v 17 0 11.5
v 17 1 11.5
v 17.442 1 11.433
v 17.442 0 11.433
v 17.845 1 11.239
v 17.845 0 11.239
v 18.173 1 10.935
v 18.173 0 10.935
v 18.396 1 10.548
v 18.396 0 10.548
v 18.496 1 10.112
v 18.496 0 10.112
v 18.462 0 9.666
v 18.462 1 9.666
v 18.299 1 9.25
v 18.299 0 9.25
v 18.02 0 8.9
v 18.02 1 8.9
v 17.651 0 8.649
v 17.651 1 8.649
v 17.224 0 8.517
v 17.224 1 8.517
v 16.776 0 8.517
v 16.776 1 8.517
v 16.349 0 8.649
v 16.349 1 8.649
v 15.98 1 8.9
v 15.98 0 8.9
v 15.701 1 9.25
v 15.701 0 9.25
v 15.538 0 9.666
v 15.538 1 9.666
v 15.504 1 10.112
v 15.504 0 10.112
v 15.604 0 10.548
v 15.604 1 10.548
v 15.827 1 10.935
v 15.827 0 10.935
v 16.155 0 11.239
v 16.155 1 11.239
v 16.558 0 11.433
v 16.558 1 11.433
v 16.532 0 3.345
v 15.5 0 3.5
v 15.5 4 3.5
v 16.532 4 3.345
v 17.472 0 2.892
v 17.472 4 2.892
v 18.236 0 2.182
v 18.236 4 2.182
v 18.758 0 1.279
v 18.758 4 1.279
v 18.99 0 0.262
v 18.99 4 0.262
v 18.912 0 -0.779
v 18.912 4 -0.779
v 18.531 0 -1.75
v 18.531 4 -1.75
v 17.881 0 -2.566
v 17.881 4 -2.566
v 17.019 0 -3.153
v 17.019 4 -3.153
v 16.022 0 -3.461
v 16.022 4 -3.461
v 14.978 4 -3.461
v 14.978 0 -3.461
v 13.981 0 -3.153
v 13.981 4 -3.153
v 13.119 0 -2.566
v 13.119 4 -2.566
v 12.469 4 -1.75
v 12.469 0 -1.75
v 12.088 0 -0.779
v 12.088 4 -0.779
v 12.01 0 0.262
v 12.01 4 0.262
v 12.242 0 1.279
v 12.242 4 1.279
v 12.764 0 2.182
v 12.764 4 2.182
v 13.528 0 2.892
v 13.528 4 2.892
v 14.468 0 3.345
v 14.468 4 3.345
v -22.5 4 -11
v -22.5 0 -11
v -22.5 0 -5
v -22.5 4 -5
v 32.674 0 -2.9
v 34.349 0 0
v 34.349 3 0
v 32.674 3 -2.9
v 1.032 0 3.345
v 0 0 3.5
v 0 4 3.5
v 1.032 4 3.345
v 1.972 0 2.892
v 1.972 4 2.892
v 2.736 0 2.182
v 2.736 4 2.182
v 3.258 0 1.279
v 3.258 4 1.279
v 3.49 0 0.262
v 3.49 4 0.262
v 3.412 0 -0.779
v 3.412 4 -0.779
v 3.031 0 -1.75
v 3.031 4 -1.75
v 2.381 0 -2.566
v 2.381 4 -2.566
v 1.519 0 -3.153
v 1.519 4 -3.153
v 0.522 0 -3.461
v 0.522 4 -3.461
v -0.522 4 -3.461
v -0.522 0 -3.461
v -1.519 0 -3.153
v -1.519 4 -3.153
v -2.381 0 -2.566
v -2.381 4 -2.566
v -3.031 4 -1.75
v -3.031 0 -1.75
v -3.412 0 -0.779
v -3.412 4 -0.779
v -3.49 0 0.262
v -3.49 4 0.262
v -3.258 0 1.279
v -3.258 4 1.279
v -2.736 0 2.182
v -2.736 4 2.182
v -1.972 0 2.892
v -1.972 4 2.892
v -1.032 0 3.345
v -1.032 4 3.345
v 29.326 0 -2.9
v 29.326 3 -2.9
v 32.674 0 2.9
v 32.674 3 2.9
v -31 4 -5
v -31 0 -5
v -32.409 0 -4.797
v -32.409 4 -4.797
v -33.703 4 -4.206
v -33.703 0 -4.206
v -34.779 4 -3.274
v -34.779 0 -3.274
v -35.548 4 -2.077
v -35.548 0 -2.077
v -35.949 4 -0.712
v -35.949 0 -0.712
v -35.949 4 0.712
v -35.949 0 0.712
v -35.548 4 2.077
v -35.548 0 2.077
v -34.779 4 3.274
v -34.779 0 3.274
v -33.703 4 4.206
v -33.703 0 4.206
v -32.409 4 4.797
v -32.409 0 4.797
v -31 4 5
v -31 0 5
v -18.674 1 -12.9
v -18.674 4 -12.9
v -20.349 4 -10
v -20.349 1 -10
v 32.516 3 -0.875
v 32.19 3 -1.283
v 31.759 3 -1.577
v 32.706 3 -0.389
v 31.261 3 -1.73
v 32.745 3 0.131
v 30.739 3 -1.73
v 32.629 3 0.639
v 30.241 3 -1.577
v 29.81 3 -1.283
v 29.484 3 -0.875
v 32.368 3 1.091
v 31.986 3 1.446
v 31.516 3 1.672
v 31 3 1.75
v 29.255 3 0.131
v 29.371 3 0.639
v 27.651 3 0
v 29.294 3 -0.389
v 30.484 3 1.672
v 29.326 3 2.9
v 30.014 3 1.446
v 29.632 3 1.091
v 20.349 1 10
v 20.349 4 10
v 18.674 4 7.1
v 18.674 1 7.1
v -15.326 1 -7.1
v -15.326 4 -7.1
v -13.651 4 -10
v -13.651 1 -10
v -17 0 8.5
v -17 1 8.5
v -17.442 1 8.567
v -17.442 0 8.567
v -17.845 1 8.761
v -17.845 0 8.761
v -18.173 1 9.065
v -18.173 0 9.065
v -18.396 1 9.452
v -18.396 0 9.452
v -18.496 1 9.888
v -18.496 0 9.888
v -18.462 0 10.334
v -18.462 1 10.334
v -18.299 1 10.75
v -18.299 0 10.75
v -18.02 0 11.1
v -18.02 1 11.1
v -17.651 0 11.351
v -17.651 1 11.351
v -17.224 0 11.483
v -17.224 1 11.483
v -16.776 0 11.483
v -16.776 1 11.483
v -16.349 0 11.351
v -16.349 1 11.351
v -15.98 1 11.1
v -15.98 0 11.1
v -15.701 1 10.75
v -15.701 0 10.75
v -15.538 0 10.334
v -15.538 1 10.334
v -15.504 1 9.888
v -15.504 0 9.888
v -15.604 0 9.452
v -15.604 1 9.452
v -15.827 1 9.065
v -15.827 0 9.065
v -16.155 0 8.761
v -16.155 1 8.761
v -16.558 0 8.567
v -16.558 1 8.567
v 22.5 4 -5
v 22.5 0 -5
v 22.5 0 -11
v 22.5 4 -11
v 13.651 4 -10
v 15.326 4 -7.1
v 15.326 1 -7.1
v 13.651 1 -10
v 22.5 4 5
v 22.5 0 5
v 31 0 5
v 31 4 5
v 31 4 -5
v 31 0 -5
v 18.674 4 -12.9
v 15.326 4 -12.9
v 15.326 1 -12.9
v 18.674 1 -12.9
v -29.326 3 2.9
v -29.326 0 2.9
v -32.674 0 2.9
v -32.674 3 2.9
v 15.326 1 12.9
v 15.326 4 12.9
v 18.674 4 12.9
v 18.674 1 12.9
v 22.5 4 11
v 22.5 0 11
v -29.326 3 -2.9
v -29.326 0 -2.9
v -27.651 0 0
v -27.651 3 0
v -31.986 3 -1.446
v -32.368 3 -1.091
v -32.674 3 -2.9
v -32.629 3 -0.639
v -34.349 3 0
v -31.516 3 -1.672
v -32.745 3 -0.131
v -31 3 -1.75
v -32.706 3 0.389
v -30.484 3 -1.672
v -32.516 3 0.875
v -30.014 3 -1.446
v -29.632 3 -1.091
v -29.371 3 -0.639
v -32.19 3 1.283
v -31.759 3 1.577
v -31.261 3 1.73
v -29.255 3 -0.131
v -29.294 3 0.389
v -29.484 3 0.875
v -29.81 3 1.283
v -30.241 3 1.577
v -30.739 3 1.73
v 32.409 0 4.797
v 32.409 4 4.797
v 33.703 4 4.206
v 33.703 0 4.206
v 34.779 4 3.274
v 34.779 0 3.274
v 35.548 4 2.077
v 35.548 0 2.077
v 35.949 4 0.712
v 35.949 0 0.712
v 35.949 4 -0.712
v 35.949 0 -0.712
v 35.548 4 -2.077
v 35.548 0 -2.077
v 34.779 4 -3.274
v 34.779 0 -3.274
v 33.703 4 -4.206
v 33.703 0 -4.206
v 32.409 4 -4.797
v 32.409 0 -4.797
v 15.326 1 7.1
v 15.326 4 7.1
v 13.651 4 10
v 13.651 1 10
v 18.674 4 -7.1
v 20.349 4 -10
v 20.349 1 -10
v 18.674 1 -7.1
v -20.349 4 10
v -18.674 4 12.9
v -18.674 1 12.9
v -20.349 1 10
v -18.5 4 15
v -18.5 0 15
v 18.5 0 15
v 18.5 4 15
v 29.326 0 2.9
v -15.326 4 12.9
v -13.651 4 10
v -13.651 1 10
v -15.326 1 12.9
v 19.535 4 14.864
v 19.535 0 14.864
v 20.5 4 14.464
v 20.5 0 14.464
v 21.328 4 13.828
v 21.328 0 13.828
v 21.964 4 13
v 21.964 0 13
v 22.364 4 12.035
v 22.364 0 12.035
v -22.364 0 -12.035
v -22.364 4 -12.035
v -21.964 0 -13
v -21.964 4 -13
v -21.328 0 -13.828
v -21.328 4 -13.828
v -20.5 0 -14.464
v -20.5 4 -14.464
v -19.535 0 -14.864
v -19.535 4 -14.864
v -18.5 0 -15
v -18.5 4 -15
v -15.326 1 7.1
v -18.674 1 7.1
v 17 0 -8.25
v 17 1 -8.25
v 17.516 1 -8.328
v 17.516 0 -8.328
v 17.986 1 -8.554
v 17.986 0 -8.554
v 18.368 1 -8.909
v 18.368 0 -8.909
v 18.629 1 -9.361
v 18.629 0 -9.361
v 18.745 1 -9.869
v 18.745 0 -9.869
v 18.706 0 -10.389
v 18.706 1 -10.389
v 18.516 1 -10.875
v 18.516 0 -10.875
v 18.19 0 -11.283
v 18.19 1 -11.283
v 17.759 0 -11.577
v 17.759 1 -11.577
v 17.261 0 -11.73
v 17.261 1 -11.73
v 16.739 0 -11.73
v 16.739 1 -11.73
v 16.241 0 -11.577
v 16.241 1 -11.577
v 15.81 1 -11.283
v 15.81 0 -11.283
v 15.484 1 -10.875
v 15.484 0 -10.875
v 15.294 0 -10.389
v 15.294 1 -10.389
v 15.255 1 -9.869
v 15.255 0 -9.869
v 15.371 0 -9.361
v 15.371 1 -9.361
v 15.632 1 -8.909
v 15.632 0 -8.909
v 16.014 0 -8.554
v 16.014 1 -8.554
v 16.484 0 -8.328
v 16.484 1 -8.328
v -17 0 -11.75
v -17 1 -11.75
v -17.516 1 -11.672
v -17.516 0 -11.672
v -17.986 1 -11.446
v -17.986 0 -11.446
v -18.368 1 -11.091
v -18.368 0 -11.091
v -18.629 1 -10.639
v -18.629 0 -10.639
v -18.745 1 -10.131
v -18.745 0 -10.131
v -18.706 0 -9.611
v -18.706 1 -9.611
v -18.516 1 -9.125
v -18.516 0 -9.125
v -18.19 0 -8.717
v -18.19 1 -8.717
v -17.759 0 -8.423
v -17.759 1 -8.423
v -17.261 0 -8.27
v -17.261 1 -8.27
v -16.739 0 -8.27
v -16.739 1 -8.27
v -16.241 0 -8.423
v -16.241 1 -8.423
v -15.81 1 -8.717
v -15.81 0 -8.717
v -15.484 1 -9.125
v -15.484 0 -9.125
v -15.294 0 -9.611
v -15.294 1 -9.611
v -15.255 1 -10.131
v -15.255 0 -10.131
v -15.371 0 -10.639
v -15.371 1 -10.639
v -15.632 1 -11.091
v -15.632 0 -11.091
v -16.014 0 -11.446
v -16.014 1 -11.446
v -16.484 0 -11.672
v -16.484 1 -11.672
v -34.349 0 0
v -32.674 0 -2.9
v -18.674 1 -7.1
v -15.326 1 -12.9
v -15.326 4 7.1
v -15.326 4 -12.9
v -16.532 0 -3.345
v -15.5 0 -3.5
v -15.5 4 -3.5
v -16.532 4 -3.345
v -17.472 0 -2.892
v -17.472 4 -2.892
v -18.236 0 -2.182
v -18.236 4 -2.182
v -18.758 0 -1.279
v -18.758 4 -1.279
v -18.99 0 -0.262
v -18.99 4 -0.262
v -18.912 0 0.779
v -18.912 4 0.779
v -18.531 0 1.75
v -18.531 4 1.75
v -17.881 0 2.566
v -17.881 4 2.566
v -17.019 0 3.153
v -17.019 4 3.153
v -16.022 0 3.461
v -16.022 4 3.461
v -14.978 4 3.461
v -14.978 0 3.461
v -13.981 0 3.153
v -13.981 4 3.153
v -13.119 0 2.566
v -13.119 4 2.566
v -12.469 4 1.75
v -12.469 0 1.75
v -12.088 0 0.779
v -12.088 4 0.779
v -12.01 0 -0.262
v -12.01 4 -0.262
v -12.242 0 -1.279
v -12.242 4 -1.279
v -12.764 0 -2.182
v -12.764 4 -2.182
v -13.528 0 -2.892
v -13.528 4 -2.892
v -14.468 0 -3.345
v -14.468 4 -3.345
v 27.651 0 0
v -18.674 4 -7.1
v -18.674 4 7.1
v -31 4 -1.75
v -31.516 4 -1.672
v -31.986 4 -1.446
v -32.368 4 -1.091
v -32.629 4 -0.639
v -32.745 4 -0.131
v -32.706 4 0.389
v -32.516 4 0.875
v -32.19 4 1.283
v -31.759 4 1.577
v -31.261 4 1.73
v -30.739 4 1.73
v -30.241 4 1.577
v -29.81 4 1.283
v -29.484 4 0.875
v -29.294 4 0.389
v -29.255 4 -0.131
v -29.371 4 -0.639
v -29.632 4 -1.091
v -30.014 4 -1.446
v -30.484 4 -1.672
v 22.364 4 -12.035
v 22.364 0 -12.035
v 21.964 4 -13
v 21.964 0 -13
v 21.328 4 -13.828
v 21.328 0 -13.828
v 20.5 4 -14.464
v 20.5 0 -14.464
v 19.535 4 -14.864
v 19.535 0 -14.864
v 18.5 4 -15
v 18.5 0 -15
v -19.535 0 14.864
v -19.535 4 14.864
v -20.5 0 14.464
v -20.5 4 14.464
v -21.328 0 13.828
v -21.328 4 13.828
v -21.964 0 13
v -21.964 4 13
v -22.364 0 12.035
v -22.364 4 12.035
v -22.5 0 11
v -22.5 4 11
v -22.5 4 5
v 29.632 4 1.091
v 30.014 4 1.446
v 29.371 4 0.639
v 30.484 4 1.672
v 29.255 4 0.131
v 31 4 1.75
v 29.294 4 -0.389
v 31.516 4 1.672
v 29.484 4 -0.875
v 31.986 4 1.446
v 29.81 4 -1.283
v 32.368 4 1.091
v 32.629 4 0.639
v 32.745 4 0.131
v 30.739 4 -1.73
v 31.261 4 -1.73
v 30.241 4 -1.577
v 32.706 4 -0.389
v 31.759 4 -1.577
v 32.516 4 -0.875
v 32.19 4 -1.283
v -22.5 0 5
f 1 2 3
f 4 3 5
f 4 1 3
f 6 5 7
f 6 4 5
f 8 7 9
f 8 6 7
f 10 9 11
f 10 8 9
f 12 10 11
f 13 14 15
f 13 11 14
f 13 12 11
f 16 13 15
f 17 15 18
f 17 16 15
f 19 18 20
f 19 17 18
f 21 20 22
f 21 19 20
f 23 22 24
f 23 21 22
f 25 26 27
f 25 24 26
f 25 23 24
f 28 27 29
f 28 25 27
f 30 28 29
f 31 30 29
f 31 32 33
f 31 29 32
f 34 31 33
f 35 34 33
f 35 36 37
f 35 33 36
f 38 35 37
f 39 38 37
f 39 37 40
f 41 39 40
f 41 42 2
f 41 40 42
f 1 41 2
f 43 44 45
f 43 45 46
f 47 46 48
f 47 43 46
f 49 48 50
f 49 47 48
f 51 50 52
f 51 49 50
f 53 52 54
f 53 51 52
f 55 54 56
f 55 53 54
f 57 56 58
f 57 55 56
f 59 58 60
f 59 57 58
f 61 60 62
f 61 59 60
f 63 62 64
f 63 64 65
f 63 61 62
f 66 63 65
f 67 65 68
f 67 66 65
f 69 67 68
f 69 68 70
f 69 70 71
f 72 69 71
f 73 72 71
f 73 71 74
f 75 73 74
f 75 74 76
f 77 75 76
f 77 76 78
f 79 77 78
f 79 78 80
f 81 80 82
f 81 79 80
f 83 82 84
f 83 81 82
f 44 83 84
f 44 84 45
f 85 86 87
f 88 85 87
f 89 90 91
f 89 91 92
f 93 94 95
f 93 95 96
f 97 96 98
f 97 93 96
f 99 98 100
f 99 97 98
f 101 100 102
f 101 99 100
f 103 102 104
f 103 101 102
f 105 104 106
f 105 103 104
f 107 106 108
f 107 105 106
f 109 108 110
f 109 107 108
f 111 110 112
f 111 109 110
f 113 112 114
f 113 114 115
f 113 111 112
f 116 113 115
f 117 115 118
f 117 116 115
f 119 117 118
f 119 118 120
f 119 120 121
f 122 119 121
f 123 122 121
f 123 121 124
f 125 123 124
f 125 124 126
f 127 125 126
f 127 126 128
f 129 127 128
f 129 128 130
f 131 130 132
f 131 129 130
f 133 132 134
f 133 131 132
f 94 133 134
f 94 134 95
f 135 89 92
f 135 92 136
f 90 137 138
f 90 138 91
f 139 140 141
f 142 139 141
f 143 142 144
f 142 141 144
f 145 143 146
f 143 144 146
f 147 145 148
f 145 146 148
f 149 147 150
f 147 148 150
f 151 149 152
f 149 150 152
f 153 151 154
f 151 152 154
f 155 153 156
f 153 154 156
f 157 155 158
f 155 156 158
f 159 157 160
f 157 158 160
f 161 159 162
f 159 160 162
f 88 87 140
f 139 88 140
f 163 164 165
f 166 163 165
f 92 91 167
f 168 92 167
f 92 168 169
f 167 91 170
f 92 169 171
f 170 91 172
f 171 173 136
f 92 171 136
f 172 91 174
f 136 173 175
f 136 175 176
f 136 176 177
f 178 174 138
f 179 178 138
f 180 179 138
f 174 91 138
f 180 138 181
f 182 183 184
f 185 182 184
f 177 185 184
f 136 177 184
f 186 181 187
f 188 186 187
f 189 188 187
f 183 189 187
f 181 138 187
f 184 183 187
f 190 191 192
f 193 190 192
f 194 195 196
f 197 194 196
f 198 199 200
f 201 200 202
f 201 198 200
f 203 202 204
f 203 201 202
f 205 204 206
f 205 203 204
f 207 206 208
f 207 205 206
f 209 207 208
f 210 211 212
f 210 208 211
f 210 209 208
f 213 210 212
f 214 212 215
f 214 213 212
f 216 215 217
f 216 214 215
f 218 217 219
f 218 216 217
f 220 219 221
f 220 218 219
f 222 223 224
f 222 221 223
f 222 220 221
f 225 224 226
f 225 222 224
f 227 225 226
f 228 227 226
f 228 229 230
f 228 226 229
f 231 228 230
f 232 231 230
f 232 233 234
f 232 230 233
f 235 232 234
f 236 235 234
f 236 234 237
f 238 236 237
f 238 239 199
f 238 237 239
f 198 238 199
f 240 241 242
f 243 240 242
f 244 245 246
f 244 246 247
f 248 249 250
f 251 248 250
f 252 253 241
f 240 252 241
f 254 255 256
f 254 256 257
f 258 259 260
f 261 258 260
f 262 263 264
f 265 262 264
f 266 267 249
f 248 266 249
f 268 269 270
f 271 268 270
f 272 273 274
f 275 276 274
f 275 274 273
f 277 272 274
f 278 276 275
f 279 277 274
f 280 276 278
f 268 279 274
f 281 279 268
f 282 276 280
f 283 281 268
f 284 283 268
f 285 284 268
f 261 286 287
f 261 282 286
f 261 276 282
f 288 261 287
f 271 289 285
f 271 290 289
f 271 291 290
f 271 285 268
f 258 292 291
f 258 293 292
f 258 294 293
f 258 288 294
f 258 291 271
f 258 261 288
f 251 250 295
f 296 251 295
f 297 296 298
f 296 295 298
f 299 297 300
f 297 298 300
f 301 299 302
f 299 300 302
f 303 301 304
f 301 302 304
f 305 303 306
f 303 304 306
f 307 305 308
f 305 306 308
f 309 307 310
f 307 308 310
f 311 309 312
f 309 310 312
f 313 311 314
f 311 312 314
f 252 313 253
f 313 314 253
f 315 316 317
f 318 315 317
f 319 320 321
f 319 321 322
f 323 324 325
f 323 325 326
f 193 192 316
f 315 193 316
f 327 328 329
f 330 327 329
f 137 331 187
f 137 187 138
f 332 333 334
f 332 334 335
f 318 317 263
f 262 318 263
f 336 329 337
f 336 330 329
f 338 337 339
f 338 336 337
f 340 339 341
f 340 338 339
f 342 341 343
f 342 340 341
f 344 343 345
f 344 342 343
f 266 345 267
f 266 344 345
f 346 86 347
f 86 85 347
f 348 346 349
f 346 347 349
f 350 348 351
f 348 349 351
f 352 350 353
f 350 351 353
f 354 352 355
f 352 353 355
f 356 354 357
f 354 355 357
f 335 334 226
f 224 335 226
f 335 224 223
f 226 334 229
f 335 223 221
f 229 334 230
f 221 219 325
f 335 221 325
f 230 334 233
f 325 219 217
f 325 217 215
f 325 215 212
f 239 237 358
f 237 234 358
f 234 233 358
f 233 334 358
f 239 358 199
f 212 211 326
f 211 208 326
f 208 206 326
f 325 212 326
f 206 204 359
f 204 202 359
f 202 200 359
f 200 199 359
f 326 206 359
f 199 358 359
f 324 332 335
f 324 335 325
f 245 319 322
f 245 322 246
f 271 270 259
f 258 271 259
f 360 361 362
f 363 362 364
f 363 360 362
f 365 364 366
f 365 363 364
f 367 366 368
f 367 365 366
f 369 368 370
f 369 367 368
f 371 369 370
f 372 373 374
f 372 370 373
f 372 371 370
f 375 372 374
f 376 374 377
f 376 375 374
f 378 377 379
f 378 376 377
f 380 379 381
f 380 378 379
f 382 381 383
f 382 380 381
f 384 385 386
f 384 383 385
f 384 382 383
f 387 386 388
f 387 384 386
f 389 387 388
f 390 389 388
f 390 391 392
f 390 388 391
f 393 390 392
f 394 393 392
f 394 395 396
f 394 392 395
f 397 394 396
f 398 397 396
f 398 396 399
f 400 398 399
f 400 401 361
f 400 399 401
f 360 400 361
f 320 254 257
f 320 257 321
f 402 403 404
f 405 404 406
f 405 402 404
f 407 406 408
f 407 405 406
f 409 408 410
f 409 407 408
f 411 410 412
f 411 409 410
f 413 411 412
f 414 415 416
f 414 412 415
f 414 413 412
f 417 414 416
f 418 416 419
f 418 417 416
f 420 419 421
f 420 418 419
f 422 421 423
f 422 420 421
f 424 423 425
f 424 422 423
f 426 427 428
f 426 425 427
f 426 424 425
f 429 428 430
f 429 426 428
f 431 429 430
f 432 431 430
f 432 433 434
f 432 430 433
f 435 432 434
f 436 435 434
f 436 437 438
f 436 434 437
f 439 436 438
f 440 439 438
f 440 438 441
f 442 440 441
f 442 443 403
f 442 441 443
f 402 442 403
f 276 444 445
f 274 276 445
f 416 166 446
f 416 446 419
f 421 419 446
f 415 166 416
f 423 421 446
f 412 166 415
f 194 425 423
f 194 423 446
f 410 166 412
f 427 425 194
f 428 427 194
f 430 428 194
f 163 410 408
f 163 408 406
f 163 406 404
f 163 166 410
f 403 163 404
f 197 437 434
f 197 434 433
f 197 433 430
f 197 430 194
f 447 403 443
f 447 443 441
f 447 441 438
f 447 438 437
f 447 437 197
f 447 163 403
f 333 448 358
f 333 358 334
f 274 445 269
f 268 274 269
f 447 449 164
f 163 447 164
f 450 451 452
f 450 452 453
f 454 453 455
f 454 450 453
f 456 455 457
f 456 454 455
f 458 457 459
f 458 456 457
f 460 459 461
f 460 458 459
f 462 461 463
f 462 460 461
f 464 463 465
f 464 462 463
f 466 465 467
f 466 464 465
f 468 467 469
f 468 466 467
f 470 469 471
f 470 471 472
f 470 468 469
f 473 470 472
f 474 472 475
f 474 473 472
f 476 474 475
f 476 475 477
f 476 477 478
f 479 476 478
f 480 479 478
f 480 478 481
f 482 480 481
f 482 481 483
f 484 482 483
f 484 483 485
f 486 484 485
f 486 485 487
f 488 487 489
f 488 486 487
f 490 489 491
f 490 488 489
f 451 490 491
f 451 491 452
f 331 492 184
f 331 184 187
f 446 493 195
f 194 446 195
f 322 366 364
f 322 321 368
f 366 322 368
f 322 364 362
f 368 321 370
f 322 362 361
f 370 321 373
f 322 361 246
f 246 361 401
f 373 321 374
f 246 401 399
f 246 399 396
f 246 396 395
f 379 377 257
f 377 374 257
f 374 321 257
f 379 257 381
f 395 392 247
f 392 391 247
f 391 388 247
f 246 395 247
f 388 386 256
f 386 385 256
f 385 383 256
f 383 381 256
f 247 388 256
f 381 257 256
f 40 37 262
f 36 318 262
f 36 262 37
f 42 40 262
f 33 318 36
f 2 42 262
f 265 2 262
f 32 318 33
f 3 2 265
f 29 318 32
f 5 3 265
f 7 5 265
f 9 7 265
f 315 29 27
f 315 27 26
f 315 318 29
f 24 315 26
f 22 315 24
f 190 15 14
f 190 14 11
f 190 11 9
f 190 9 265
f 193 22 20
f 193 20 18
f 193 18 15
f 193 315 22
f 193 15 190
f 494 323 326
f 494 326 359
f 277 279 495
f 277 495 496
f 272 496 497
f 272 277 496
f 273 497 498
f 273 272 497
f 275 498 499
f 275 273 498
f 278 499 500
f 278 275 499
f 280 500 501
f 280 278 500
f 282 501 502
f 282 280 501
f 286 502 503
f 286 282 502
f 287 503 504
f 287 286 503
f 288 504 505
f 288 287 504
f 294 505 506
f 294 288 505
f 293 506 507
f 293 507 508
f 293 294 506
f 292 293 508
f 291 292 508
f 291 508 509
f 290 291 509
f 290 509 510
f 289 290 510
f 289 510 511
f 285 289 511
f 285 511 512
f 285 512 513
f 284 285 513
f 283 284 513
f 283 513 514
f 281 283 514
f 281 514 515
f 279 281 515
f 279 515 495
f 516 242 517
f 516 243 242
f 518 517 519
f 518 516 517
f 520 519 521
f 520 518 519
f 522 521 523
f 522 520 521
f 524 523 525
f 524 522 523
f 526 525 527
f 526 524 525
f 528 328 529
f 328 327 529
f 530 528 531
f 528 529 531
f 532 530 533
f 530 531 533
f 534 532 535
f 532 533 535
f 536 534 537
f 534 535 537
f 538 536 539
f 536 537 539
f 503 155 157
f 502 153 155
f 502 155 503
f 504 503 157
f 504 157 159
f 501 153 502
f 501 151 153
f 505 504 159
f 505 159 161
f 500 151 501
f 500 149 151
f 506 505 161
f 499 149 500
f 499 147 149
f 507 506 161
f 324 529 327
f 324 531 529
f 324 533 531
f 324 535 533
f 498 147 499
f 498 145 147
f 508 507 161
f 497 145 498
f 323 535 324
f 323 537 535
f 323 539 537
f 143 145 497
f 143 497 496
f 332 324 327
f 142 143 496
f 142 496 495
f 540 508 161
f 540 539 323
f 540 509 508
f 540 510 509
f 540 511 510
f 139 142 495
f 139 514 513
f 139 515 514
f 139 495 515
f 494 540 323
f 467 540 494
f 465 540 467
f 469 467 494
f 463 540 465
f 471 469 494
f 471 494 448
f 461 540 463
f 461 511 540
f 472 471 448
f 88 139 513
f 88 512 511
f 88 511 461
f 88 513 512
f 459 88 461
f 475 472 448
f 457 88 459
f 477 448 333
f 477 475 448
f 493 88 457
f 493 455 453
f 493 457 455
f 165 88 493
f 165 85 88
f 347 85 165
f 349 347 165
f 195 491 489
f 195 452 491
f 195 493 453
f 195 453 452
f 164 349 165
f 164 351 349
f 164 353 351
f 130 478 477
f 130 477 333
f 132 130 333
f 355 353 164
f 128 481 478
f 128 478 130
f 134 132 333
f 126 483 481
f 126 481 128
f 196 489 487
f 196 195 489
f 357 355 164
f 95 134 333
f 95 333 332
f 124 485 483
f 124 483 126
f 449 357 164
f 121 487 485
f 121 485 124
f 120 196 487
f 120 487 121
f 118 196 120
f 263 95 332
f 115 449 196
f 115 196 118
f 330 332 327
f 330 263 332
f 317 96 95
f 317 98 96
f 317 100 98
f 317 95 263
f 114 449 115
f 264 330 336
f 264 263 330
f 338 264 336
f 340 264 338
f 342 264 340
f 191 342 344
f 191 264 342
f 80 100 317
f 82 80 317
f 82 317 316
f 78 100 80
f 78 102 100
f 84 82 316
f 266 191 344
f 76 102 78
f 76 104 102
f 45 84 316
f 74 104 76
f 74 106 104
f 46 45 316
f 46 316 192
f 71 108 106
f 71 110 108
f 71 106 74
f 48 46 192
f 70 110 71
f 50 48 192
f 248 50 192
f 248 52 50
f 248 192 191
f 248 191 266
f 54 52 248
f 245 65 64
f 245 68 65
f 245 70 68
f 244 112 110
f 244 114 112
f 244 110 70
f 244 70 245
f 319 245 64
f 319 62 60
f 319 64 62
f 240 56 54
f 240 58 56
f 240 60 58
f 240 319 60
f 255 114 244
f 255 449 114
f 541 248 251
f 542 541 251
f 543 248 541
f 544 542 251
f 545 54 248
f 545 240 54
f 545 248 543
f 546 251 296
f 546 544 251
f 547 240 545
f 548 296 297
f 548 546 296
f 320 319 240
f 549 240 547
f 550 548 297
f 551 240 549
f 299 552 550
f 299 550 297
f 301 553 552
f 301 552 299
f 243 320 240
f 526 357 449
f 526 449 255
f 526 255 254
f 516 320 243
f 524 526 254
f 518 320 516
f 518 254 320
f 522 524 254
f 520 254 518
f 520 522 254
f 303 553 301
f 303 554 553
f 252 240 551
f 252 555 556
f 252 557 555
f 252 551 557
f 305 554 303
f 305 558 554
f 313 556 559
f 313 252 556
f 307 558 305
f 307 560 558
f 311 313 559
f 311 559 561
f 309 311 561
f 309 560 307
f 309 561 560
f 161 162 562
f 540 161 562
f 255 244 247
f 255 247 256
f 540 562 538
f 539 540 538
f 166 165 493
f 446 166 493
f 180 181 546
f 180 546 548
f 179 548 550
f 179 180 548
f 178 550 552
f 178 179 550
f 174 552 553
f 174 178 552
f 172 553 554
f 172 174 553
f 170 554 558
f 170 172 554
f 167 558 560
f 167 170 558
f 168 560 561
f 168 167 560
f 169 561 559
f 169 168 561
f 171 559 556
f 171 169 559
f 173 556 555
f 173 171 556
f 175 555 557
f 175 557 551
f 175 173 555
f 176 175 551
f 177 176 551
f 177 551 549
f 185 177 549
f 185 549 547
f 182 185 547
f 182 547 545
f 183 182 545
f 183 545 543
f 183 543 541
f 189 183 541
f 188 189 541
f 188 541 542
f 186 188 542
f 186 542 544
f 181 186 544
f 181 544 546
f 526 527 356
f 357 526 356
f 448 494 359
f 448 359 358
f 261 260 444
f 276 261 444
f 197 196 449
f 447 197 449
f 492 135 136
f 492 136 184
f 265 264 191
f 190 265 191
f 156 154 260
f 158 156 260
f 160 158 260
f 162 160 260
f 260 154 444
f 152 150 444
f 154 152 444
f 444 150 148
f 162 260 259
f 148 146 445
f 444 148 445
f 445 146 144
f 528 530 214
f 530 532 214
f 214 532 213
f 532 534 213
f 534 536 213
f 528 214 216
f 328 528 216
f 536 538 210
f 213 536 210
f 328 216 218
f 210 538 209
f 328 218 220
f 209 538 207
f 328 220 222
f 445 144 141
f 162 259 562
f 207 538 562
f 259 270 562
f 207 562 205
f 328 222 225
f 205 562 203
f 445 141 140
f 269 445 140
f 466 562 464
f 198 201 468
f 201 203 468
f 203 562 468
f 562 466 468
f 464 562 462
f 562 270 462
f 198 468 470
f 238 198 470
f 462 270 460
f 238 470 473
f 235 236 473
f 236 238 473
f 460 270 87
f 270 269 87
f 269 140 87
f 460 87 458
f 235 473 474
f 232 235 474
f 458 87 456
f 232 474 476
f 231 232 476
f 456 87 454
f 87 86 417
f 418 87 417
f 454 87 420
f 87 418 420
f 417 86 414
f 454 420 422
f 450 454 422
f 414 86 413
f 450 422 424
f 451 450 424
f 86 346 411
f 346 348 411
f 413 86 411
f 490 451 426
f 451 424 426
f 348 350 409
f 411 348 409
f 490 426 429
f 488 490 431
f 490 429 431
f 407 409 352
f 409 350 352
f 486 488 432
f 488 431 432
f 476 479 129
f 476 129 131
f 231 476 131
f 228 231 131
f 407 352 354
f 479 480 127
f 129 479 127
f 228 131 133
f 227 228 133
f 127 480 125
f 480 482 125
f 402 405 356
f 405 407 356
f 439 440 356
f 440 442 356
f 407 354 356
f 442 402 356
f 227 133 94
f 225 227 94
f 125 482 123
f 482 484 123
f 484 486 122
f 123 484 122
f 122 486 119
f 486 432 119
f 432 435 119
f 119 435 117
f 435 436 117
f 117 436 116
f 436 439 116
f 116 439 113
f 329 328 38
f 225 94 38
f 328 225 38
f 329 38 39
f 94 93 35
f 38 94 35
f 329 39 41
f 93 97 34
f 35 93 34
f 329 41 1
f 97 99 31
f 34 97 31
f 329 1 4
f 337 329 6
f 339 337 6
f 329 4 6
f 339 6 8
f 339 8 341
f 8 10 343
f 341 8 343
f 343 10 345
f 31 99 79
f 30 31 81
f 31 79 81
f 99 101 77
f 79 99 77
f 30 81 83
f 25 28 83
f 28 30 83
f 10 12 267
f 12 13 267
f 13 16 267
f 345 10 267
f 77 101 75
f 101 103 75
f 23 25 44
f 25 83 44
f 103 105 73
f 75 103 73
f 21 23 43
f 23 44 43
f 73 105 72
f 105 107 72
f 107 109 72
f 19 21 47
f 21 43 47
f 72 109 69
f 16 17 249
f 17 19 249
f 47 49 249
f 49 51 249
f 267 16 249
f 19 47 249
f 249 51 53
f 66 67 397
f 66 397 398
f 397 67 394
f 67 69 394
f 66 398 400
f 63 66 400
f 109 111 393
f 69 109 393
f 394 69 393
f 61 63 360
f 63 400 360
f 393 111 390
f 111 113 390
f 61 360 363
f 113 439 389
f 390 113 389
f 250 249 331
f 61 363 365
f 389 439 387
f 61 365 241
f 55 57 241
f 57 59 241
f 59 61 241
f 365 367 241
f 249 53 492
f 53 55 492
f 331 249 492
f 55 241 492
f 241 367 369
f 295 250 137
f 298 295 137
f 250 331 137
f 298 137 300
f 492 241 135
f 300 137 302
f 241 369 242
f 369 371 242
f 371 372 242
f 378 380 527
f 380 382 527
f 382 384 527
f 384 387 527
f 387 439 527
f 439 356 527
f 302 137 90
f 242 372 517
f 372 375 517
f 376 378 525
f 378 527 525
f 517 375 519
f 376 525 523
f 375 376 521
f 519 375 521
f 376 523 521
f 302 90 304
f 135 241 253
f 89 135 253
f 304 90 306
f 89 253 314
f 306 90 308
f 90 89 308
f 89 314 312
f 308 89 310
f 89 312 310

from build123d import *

# Parameters (mm, degrees)
ESBO_O2_R                = 1.75
ESBO_O2_R_2              = 1.5
ESBO_O2_R_3              = 3.5
RESSALTO_EXTRUS_O1_DEPTH = 4
CORTE_EXTRUS_O1_DEPTH    = 3
FILETE1_R                = 4
CORTE_EXTRUS_O2_DEPTH    = 3


with BuildPart() as part:
    # Esboço2 → Ressalto-extrusão1 (new body)
    with BuildSketch(Plane(origin=(0, 0, 0), x_dir=(1, 0, 0), z_dir=(0, 1, 0))):
        with BuildLine():
            Line((-22.5, -15), (22.5, -15))
            Line((22.5, -15), (22.5, -5))
            Line((22.5, -5), (31, -5))
            ThreePointArc((31, -5), (36, 0), (31, 5))
            Line((31, 5), (22.5, 5))
            Line((22.5, 5), (22.5, 15))
            Line((22.5, 15), (-22.5, 15))
            Line((-22.5, 15), (-22.5, 5))
            Line((-22.5, 5), (-31, 5))
            ThreePointArc((-31, 5), (-36, 0), (-31, -5))
            Line((-31, -5), (-22.5, -5))
            Line((-22.5, -5), (-22.5, -15))
        make_face()
        with Locations(Location((17, 10, 0), (0, 0, 270))):
            Circle(ESBO_O2_R, mode=Mode.SUBTRACT)
        with Locations(Location((17, -10, 0), (0, 0, 270))):
            Circle(ESBO_O2_R_2, mode=Mode.SUBTRACT)
        with Locations(Location((-17, -10, 0), (0, 0, 90))):
            Circle(ESBO_O2_R_2, mode=Mode.SUBTRACT)
        with Locations(Location((-17, 10, 0), (0, 0, 90))):
            Circle(ESBO_O2_R, mode=Mode.SUBTRACT)
        with Locations(Location((31, 0, 0), (0, 0, 270))):
            Circle(ESBO_O2_R, mode=Mode.SUBTRACT)
        with Locations(Location((-31, 0, 0), (0, 0, 90))):
            Circle(ESBO_O2_R, mode=Mode.SUBTRACT)
        with Locations(Location((0, 0, 0), (0, 0, 270))):
            Circle(ESBO_O2_R_3, mode=Mode.SUBTRACT)
        with Locations(Location((15.5, 0, 0), (0, 0, 270))):
            Circle(ESBO_O2_R_3, mode=Mode.SUBTRACT)
        with Locations(Location((-15.5, 0, 0), (0, 0, 90))):
            Circle(ESBO_O2_R_3, mode=Mode.SUBTRACT)
    extrude(amount=RESSALTO_EXTRUS_O1_DEPTH)

    # Esboço3 → Corte-extrusão1 (cut)
    with BuildSketch(Plane(origin=(0, 4, 0), x_dir=(1, 0, 0), z_dir=(0, 1, 0))):
        Polygon((-13.651368439, 10), (-15.325684219, 12.9), (-18.674315781, 12.9), (-20.348631561, 10), (-18.674315781, 7.1), (-15.325684219, 7.1), align=None)
        Polygon((-20.348631561, -10), (-18.674315781, -7.1), (-15.325684219, -7.1), (-13.651368439, -10), (-15.325684219, -12.9), (-18.674315781, -12.9), align=None)
        Polygon((18.674315781, -7.1), (15.325684219, -7.1), (13.651368439, -10), (15.325684219, -12.9), (18.674315781, -12.9), (20.348631561, -10), align=None)
        Polygon((15.325684219, 7.1), (13.651368439, 10), (15.325684219, 12.9), (18.674315781, 12.9), (20.348631561, 10), (18.674315781, 7.1), align=None)
    extrude(amount=-CORTE_EXTRUS_O1_DEPTH, mode=Mode.SUBTRACT)

    # Filete1
    filete1_edges = [part.edges().sort_by_distance(p)[0] for p in [
        (22.5, 2, 15),
        (-22.5, 2, 15),
        (-22.5, 2, -15),
        (22.5, 2, -15),
    ]]
    fillet(filete1_edges, radius=FILETE1_R)

    # Esboço6 → Corte-extrusão2 (cut)
    with BuildSketch(Plane.XZ):
        Polygon((-27.651368439, 0), (-29.325684219, 2.9), (-32.674315781, 2.9), (-34.348631561, 0), (-32.674315781, -2.9), (-29.325684219, -2.9), align=None)
        Polygon((29.325684219, -2.9), (27.651368439, 0), (29.325684219, 2.9), (32.674315781, 2.9), (34.348631561, 0), (32.674315781, -2.9), align=None)
    extrude(amount=-CORTE_EXTRUS_O2_DEPTH, mode=Mode.SUBTRACT)


solid = part.part
